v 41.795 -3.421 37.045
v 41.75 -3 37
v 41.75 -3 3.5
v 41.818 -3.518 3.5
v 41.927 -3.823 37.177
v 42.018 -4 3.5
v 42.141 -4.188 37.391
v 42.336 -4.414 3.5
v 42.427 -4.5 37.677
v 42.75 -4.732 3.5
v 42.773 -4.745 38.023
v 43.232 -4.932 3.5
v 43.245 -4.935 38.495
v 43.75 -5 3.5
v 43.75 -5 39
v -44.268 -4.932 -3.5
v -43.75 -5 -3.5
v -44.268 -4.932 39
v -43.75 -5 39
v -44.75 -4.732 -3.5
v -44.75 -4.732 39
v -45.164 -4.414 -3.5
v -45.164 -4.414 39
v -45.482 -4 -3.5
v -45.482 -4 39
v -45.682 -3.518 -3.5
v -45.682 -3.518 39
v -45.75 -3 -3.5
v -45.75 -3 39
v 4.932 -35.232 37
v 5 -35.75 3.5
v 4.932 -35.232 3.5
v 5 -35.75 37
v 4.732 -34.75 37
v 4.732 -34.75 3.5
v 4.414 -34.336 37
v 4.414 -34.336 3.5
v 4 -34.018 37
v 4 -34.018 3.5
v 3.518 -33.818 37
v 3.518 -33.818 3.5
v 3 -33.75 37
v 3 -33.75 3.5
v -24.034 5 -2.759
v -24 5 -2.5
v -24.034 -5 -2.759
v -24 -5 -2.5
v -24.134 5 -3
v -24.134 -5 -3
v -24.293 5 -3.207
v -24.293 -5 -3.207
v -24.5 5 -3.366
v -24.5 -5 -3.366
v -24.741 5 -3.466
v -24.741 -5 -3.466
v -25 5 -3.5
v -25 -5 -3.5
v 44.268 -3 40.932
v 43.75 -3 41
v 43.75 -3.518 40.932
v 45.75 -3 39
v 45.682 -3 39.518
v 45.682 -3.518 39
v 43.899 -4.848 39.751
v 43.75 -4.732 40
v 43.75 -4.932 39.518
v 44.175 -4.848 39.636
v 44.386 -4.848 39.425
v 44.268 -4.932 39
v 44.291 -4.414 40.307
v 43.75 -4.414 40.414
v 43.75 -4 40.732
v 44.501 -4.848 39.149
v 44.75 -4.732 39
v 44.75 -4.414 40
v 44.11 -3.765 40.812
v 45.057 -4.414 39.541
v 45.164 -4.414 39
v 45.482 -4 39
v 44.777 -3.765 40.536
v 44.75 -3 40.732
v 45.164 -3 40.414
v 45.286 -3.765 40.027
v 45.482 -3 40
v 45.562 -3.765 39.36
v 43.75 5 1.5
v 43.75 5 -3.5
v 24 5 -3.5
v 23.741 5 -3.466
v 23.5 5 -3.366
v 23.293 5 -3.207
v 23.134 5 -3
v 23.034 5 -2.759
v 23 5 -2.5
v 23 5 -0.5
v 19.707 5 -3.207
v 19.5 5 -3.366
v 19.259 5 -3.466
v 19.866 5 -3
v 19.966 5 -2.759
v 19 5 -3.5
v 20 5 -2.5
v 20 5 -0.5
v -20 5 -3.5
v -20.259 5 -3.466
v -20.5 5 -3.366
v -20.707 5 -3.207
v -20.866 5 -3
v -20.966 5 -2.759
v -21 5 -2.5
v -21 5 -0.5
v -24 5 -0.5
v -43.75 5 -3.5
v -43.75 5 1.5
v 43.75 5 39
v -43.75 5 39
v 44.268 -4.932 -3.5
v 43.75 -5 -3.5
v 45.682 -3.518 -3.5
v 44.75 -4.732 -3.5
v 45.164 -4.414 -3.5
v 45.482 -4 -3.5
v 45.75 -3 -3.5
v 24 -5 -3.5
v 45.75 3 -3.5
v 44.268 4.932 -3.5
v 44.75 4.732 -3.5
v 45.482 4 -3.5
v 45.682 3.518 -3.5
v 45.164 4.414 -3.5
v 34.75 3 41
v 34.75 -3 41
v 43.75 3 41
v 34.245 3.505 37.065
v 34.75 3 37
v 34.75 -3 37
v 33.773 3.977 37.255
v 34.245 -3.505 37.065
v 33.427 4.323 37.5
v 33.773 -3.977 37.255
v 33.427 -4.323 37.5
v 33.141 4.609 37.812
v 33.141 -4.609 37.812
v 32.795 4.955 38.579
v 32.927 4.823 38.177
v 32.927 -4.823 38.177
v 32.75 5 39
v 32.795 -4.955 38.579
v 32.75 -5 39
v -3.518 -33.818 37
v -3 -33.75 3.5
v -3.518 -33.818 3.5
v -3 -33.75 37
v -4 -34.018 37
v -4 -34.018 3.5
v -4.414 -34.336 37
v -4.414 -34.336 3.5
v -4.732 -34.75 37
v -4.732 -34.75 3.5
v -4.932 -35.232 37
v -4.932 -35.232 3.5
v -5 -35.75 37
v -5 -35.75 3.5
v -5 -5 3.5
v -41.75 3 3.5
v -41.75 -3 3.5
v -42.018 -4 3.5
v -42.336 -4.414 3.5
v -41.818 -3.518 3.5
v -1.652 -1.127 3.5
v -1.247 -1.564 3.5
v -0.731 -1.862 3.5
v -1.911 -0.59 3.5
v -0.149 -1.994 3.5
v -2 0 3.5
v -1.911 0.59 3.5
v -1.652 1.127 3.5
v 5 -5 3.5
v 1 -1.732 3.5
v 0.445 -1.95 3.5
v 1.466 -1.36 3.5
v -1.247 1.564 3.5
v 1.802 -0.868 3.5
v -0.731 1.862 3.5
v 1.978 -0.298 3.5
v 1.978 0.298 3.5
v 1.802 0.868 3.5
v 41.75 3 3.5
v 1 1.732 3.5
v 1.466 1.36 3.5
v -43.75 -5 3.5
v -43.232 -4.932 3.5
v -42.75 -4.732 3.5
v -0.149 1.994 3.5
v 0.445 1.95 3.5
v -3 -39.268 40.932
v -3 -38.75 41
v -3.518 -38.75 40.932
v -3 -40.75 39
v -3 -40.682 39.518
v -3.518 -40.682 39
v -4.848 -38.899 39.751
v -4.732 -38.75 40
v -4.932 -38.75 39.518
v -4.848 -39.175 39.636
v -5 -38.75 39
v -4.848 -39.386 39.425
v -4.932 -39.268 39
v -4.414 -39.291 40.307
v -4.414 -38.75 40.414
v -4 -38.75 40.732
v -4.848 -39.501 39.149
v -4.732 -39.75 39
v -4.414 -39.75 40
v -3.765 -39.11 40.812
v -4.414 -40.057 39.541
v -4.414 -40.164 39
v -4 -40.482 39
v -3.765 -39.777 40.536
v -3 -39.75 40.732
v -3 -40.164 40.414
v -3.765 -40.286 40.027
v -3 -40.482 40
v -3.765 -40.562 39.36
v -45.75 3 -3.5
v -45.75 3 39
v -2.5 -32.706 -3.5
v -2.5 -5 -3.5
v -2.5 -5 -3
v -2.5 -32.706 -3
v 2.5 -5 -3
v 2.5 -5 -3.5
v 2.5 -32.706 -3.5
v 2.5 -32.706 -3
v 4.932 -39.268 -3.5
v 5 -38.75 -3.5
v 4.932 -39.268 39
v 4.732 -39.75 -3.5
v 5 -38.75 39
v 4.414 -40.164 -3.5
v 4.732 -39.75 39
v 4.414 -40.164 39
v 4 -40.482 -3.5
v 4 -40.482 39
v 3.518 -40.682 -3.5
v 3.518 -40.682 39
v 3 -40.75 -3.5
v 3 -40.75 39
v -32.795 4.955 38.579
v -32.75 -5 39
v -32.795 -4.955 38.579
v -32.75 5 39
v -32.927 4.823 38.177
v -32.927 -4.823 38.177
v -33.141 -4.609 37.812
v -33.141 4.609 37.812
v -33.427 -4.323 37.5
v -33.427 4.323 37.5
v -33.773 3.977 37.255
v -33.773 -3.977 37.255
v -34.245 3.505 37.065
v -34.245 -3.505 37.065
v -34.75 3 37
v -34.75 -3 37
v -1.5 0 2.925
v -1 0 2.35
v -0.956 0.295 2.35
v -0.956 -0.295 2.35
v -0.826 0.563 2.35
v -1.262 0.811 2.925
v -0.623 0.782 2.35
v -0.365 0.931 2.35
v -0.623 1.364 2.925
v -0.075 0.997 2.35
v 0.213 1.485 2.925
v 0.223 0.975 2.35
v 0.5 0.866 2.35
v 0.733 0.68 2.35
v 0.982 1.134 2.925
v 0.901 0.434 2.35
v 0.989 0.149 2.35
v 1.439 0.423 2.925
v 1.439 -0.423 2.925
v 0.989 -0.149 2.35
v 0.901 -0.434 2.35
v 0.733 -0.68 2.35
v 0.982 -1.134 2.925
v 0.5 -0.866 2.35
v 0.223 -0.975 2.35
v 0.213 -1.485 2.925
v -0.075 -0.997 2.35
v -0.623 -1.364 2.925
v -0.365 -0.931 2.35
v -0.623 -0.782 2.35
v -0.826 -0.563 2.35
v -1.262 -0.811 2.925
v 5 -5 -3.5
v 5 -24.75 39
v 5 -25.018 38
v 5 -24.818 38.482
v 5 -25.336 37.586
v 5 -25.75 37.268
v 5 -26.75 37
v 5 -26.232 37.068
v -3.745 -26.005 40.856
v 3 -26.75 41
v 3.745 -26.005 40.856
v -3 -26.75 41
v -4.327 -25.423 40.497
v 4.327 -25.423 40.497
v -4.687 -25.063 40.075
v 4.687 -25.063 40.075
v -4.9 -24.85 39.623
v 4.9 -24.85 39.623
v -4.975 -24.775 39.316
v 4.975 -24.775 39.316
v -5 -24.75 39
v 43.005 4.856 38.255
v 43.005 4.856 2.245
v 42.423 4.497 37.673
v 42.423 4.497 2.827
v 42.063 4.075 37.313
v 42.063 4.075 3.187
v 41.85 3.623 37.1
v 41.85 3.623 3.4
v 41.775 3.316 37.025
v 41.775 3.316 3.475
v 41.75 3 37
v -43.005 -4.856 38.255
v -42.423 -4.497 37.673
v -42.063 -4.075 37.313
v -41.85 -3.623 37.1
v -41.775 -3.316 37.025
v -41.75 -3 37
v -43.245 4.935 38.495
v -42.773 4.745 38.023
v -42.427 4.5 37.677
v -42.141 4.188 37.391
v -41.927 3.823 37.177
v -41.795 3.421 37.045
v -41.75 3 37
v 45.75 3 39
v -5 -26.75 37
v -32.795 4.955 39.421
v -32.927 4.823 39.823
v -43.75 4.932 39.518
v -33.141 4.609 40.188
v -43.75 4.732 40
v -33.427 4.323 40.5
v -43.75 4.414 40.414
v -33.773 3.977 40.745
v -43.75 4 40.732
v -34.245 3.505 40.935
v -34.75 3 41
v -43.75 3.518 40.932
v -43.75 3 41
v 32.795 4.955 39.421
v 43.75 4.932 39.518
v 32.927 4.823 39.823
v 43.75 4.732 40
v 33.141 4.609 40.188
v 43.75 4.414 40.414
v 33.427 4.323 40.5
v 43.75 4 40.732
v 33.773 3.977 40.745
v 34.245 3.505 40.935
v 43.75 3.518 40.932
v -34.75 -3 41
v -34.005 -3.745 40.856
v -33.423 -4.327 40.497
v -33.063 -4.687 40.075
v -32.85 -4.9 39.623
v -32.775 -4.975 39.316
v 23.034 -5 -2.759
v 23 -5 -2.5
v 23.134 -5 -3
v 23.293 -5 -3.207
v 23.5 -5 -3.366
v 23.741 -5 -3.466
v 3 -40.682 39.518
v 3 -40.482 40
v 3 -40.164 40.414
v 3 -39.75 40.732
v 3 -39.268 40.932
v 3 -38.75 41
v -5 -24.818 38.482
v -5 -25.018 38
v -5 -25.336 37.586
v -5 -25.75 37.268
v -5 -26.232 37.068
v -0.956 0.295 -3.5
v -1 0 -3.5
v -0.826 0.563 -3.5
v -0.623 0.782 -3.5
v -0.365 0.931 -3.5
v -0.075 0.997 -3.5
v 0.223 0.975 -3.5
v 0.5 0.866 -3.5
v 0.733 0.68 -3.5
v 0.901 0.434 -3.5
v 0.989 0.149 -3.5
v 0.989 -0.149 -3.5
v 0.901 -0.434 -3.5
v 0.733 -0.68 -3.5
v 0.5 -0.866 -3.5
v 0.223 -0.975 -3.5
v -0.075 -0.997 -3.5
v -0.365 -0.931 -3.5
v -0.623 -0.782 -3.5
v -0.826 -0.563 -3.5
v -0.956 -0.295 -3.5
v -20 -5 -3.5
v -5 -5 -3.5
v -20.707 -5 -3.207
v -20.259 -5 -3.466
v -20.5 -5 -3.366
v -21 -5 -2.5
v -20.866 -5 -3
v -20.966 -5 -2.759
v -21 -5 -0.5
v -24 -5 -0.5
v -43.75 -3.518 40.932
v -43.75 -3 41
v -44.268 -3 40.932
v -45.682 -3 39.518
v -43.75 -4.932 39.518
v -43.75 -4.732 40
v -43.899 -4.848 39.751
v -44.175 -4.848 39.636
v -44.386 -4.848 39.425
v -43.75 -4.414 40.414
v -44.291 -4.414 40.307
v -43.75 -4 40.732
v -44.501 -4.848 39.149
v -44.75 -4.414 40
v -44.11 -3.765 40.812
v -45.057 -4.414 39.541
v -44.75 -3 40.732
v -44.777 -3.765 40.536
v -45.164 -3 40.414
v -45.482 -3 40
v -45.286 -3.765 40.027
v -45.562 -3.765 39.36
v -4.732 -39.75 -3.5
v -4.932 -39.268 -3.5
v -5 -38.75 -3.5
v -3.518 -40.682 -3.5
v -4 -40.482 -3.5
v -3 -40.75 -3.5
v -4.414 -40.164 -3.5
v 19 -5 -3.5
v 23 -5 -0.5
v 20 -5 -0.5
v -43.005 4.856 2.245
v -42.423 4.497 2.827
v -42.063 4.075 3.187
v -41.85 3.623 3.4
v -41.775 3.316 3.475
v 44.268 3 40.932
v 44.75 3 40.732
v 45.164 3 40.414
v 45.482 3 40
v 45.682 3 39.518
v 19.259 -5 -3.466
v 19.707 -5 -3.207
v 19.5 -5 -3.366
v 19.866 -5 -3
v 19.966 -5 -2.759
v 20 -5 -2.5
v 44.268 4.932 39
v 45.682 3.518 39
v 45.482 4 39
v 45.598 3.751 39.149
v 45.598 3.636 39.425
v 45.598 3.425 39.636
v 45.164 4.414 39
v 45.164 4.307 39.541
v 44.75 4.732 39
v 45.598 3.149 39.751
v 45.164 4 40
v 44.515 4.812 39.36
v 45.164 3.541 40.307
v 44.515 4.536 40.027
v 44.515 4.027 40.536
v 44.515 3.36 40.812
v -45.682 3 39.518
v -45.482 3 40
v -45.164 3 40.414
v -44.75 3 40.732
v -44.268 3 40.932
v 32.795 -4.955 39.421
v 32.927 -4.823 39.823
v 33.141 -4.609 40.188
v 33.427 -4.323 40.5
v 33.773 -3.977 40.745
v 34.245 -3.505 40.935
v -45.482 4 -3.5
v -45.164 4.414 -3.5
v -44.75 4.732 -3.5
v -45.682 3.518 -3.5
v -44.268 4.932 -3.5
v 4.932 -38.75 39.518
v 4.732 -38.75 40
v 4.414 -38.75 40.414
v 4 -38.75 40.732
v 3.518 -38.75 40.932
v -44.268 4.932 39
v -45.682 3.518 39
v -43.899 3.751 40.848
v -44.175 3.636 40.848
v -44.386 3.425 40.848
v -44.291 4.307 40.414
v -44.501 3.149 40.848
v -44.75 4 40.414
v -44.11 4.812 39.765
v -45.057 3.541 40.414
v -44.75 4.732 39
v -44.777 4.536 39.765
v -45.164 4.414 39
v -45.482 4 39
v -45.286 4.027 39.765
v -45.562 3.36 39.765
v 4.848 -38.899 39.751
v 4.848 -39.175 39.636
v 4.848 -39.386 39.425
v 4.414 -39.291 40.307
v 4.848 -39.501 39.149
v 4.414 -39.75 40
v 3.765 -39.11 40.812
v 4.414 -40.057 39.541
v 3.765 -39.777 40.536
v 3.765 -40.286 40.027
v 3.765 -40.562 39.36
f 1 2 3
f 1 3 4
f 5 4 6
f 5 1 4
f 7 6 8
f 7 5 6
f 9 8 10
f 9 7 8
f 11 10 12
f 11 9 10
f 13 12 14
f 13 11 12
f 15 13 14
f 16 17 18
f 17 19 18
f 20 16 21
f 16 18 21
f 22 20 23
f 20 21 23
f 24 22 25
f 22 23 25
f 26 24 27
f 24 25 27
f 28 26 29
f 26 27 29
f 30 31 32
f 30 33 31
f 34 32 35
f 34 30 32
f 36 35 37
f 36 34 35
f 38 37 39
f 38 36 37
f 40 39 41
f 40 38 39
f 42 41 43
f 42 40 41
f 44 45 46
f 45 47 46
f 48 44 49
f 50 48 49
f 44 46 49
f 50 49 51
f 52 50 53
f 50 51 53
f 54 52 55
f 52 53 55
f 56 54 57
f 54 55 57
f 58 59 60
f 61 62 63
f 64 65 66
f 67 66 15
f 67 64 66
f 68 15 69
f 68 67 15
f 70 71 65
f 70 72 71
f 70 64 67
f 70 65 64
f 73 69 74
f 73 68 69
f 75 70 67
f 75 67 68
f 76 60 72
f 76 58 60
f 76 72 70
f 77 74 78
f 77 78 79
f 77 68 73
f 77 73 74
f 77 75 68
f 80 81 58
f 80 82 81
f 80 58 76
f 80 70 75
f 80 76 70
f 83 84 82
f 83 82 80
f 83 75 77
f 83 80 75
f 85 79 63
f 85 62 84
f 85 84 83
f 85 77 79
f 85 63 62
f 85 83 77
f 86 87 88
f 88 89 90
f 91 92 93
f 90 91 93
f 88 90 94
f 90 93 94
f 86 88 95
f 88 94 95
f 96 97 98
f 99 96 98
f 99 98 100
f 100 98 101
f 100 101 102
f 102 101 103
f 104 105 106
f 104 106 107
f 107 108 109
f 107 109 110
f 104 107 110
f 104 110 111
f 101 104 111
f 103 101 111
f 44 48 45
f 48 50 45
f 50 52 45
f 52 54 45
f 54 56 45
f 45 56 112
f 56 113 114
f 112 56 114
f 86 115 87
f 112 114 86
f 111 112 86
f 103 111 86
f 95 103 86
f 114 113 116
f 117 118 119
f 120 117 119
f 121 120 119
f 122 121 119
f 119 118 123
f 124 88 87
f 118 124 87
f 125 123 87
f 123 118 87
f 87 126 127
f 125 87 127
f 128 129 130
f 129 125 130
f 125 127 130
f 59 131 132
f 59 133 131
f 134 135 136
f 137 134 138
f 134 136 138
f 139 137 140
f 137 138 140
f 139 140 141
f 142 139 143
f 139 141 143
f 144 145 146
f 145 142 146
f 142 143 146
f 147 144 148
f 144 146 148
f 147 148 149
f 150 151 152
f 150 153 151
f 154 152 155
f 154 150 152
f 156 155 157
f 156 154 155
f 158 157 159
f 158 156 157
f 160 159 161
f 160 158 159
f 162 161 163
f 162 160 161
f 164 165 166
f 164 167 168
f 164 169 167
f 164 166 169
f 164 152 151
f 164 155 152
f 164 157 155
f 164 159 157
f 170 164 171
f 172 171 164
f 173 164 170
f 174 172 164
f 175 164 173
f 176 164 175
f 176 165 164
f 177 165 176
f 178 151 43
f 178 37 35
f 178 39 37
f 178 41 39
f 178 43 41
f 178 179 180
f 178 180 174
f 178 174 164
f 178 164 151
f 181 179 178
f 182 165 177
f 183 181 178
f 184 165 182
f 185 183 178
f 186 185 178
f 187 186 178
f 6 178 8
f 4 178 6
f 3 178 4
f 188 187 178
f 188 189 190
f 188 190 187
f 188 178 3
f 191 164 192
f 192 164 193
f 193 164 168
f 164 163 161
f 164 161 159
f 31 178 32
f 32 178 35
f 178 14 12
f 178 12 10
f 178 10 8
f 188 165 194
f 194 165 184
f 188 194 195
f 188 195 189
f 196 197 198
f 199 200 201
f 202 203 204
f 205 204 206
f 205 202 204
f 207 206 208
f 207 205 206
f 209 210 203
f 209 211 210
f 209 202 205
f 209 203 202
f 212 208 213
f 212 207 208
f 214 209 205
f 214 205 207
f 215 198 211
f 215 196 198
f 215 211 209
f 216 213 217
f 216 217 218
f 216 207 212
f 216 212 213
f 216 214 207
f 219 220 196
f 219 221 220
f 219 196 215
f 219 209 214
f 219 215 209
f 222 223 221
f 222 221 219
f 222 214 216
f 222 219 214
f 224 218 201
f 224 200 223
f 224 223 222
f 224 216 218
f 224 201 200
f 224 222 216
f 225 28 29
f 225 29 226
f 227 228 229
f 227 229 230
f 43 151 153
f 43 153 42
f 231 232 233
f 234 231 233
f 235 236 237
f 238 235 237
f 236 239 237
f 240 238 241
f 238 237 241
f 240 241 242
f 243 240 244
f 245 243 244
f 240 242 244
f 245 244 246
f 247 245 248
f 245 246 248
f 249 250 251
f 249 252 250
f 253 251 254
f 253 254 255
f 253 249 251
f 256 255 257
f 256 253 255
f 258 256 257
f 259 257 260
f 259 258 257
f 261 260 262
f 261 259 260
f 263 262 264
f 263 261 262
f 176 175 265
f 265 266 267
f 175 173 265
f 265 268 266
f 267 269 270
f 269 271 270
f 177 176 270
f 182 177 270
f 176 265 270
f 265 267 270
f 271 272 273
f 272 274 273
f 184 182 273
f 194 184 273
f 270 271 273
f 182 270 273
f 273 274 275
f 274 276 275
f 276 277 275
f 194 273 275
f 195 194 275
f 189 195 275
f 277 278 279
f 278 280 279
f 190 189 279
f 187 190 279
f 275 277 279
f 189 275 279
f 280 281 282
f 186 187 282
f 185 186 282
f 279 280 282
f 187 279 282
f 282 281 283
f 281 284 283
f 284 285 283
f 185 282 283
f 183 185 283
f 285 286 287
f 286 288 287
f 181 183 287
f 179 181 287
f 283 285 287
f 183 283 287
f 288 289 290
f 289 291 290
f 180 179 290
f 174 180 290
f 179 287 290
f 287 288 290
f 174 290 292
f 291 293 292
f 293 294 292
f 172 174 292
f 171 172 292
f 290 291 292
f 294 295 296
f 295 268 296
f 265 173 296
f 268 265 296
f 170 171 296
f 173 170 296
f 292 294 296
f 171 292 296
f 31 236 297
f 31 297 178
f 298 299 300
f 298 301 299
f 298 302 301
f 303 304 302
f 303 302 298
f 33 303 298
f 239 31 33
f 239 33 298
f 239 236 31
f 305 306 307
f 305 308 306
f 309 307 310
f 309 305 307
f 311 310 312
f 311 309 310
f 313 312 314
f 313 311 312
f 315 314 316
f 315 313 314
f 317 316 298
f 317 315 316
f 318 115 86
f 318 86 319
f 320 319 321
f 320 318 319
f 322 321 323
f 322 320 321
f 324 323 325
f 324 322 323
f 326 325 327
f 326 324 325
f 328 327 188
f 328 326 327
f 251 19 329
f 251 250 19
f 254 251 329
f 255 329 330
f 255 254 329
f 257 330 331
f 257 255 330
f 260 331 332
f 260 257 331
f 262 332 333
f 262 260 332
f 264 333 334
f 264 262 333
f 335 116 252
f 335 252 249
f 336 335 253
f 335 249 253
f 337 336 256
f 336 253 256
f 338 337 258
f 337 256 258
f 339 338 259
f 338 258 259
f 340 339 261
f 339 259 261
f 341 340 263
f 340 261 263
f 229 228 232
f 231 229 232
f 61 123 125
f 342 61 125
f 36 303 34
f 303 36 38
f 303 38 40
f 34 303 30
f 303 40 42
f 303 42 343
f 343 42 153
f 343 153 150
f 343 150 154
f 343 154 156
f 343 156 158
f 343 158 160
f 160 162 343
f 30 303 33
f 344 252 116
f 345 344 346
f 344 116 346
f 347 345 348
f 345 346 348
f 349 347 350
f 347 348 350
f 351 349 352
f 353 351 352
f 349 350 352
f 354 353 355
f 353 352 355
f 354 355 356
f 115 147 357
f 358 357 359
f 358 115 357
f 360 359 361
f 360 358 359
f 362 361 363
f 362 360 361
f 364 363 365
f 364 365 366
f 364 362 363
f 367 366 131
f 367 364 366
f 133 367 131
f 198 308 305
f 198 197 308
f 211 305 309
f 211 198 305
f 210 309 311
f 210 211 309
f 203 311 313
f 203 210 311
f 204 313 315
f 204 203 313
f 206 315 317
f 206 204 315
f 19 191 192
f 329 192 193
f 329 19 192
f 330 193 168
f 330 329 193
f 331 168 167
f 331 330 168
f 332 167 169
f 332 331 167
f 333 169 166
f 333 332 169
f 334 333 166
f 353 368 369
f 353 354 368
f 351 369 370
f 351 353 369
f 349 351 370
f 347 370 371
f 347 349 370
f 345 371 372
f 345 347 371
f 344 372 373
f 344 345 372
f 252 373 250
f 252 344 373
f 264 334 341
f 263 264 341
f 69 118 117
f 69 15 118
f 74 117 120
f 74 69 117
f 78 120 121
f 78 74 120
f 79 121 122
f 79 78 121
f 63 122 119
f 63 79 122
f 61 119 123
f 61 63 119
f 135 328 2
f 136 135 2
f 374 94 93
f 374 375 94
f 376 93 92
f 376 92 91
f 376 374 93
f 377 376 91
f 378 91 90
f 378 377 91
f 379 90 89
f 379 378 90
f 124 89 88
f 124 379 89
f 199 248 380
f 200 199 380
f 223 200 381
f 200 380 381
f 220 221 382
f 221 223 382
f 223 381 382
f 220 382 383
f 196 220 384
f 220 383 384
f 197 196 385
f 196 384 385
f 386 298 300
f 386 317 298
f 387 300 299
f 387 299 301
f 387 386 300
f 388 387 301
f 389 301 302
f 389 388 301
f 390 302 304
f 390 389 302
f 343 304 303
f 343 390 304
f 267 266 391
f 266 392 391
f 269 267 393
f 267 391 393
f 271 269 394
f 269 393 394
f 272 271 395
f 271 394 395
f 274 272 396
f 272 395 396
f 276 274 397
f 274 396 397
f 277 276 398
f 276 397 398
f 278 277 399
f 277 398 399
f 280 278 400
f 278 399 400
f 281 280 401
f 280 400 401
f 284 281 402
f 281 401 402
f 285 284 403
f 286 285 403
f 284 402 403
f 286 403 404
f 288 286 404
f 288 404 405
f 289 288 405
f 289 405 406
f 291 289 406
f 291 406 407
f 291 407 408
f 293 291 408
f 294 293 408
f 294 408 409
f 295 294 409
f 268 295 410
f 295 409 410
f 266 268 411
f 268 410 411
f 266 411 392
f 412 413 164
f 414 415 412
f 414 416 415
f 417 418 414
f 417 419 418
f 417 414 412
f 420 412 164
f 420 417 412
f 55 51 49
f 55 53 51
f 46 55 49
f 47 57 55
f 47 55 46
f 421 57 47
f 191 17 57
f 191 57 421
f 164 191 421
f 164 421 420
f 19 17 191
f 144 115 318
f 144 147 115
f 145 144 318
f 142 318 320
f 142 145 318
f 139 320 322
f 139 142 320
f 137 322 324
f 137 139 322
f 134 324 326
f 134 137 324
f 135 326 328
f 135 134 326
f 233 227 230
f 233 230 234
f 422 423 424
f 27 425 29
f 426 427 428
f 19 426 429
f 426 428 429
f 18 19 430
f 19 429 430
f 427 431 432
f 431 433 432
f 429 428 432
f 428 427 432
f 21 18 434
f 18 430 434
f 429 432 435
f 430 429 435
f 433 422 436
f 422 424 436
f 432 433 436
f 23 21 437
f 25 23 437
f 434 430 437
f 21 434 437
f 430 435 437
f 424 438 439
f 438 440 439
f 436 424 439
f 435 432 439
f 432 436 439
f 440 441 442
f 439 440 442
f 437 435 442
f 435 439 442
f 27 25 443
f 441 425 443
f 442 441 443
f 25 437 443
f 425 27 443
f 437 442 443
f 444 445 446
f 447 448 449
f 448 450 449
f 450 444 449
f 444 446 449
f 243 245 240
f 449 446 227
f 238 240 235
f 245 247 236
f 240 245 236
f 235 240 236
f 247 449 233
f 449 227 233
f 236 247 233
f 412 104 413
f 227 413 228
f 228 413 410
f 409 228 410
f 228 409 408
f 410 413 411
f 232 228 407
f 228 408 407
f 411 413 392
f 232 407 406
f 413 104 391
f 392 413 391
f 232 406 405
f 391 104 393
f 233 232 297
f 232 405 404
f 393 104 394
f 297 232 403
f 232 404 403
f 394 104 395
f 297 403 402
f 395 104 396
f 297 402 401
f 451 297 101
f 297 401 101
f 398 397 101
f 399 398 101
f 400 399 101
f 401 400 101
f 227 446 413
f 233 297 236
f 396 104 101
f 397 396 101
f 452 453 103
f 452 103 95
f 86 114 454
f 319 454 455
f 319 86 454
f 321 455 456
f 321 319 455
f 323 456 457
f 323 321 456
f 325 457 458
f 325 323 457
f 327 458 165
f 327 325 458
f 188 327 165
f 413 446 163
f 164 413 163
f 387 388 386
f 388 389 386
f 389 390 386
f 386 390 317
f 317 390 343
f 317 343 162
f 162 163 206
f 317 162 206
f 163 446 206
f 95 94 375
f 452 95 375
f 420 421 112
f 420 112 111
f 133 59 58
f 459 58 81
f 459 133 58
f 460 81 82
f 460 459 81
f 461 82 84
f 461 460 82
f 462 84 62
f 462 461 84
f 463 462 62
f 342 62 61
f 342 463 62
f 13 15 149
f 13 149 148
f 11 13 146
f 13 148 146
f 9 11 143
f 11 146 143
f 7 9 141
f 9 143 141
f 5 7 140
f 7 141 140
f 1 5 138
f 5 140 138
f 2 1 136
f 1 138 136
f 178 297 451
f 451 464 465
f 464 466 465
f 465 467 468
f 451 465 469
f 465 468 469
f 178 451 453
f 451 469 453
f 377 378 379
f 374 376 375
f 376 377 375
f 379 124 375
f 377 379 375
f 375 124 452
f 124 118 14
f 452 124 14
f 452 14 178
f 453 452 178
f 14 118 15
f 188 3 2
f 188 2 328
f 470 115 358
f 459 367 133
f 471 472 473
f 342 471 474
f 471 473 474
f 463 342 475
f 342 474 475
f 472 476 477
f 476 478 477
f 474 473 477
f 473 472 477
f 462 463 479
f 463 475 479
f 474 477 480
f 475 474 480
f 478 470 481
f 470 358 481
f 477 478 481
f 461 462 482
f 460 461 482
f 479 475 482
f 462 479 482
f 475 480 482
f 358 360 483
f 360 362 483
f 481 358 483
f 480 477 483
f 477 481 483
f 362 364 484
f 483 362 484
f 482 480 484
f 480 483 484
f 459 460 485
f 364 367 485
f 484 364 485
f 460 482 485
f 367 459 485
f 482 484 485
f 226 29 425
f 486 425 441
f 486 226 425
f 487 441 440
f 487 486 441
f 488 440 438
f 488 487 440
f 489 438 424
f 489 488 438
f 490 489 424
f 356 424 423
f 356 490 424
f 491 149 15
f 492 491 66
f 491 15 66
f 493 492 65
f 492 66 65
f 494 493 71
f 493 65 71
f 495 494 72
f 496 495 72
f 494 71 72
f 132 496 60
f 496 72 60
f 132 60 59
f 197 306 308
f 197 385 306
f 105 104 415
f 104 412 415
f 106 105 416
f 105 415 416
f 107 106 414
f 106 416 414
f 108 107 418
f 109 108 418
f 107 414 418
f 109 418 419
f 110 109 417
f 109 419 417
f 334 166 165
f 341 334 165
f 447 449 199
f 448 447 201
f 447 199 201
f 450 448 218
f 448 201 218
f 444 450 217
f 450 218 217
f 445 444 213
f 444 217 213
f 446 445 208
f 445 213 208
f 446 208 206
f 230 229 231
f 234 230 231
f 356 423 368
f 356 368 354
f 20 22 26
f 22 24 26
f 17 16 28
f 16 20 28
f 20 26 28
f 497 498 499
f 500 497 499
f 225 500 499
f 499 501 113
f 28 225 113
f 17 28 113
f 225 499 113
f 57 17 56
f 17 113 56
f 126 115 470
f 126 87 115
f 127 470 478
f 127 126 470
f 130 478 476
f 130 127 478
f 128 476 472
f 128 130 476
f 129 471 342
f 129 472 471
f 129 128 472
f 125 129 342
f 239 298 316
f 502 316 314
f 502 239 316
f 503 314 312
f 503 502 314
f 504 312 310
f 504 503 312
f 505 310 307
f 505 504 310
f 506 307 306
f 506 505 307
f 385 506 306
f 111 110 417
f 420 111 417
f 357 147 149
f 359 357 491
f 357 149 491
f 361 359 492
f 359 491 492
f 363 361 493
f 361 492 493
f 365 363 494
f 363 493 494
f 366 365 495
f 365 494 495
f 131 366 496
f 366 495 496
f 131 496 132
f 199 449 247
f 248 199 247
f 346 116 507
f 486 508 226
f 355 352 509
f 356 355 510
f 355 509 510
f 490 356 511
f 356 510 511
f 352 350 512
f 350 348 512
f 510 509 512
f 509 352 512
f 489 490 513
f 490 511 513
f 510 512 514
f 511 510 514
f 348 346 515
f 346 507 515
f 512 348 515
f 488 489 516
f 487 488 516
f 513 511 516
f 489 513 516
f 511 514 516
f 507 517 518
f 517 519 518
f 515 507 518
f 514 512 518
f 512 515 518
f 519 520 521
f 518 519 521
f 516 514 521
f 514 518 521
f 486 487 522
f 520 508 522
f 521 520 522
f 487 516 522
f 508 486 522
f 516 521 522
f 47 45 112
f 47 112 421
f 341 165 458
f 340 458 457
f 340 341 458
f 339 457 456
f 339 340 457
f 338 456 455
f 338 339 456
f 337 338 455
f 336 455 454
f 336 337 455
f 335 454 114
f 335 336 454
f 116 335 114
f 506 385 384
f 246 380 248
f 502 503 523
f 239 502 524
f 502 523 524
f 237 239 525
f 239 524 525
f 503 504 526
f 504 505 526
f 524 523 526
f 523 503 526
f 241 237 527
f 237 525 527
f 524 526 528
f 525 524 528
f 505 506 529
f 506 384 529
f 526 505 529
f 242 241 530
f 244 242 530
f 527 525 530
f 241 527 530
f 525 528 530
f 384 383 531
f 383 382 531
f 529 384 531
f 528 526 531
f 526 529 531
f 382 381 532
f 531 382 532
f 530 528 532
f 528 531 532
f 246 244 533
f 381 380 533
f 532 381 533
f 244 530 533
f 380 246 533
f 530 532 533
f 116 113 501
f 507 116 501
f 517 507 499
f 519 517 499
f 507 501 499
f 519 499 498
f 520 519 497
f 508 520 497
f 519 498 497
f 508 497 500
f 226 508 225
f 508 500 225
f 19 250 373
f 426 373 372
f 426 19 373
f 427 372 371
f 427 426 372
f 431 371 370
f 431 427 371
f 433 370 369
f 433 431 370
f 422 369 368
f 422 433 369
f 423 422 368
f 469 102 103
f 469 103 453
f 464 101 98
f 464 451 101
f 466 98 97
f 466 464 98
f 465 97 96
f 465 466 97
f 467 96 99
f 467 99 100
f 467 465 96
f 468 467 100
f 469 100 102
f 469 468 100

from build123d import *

# Parameters (mm, degrees)
F0_W            = 91.5
F0_H            = 7
F1_DEPTH        = 5
F2_W            = 5
F2_H            = 40.75
F3_DEPTH        = 3.5
F4_W            = 4
F4_H            = 10
F5_DEPTH        = 37.5
F6_W            = 4
F6_H            = 10
F7_DEPTH        = 37.5
F8_W            = 10
F8_H            = 7
F9_DEPTH        = 37.5
F10_W           = 10
F10_H           = 4
F11_DEPTH       = 9
F12_W           = 10
F12_H           = 4
F13_DEPTH       = 9
F14_W           = 10
F14_H           = 4
F15_DEPTH       = 9
F16_R           = 1.99999
F18_D           = 2
F18_DEPTH       = 18
F18_CSINK_D     = 4
F18_CSINK_ANGLE = 82
F18_TIP         = 0.600860619
F19_W           = 3
F19_H           = 10
F20_DEPTH       = 3
F21_R           = 1
F22_W           = 5
F22_H           = 27.7060836997
F23_DEPTH       = 0.5


# Not quite as in the source:
# - a fillet or chamfer is up to 0.001 mm smaller than in the source, because OpenCascade refuses the exact size


with BuildPart() as f1:
    # F0 (on Front) → F1 (new body, symmetric)
    with BuildSketch(Plane.XZ):
        Rectangle(F0_W, F0_H)
    extrude(amount=F1_DEPTH, both=True)

    # F2 (on Top) → F3 (join, symmetric)
    with BuildSketch(Plane.XY):
        with Locations((-2.5, -20.375)):
            Rectangle(F2_W, F2_H)
        with Locations((2.5, -20.375)):
            Rectangle(F2_W, F2_H)
    extrude(amount=F3_DEPTH, both=True)

    # F4 (on face) → F5 (join)
    with BuildSketch(Plane.XY.offset(3.5)):
        with Locations((-43.75, 0)):
            Rectangle(F4_W, F4_H)
    extrude(amount=F5_DEPTH)

    # F6 (on face) → F7 (join)
    with BuildSketch(Plane.XY.offset(3.5)):
        with Locations((43.75, 0)):
            Rectangle(F6_W, F6_H)
    extrude(amount=F7_DEPTH)

    # F8 (on face) → F9 (join)
    with BuildSketch(Plane.XY.offset(3.5)):
        with Locations((0, -37.25)):
            Rectangle(F8_W, F8_H)
    extrude(amount=F9_DEPTH)

    # F10 (on face) → F11 (join)
    with BuildSketch(Plane(origin=(0, -33.75, 0), x_dir=(-1, 0, 0), z_dir=(0, 1, 0))):
        with Locations((0, 39)):
            Rectangle(F10_W, F10_H)
    extrude(amount=F11_DEPTH)

    # F12 (on face) → F13 (join)
    with BuildSketch(Plane(origin=(41.75, 0, 0), x_dir=(0, -1, 0), z_dir=(-1, 0, 0))):
        with Locations((0, 39)):
            Rectangle(F12_W, F12_H)
    extrude(amount=F13_DEPTH)

    # F14 (on face) → F15 (join)
    with BuildSketch(Plane.YZ.offset(-41.75)):
        with Locations((0, 39)):
            Rectangle(F14_W, F14_H)
    extrude(amount=F15_DEPTH)

    # F16 (radius 2 in the source; OpenCascade refuses exactly that, so slightly less here)
    f16_edges = [f1.edges().sort_by_distance(p)[0] for p in [
        (0, 5, 3.5),
        (41.75, 5, 20.25),
        (37.25, 5, 37),
        (-41.75, 5, 20.25),
        (-37.25, 5, 37),
        (32.75, 0, 41),
        (39.25, 5, 41),
        (45.75, 5, 18.75),
        (-45.75, 5, 18.75),
        (-39.25, 5, 41),
        (-32.75, 0, 41),
        (0, -24.75, 41),
        (-5, -33.75, 20.25),
        (5, -33.75, 20.25),
        (-41.75, -5, 20.25),
        (41.75, -5, 20.25),
        (-37.25, -5, 37),
        (37.25, -5, 37),
        (-45.75, 0, 41),
        (45.75, 0, 41),
        (0, -40.75, 41),
        (5, -32.75, 41),
        (-5, -32.75, 41),
        (0, -24.75, 37),
        (-5, -40.75, 18.75),
        (5, -40.75, 18.75),
        (39.25, -5, 41),
        (-39.25, -5, 41),
        (-45.75, -5, 18.75),
        (45.75, -5, 18.75),
        (-32.75, 0, 37),
        (32.75, 0, 37),
    ]]
    fillet(f16_edges, radius=F16_R)

    # F18
    with Locations(Plane.XY.offset(3.5)):
        with Locations((0, 0)):
            CounterSinkHole(F18_D / 2, F18_CSINK_D / 2, depth=F18_DEPTH, counter_sink_angle=F18_CSINK_ANGLE)
            with Locations((0, 0, -(F18_DEPTH + F18_TIP / 2))):  # 118° drill point
                Cone(0, F18_D / 2, F18_TIP, mode=Mode.SUBTRACT)

    # F19 (on face) → F20 (cut)
    with BuildSketch(Plane(origin=(0, 0, -3.5), x_dir=(1, 0, 0), z_dir=(0, 0, -1))):
        with Locations((21.5, 0)):
            Rectangle(F19_W, F19_H)
        with Locations((-22.5, 0)):
            Rectangle(F19_W, F19_H)
    extrude(amount=-F20_DEPTH, mode=Mode.SUBTRACT)

    # F21
    f21_edges = [f1.edges().sort_by_distance(p)[0] for p in [
        (20, 0, -3.5),
        (23, 0, -3.5),
        (-21, 0, -3.5),
        (-24, 0, -3.5),
    ]]
    fillet(f21_edges, radius=F21_R)

    # F22 (on face) → F23 (cut)
    with BuildSketch(Plane(origin=(0, 0, -3.5), x_dir=(1, 0, 0), z_dir=(0, 0, -1))):
        with Locations((0, 18.8530418498)):
            Rectangle(F22_W, F22_H)
    extrude(amount=-F23_DEPTH, mode=Mode.SUBTRACT)


solid = f1.part
